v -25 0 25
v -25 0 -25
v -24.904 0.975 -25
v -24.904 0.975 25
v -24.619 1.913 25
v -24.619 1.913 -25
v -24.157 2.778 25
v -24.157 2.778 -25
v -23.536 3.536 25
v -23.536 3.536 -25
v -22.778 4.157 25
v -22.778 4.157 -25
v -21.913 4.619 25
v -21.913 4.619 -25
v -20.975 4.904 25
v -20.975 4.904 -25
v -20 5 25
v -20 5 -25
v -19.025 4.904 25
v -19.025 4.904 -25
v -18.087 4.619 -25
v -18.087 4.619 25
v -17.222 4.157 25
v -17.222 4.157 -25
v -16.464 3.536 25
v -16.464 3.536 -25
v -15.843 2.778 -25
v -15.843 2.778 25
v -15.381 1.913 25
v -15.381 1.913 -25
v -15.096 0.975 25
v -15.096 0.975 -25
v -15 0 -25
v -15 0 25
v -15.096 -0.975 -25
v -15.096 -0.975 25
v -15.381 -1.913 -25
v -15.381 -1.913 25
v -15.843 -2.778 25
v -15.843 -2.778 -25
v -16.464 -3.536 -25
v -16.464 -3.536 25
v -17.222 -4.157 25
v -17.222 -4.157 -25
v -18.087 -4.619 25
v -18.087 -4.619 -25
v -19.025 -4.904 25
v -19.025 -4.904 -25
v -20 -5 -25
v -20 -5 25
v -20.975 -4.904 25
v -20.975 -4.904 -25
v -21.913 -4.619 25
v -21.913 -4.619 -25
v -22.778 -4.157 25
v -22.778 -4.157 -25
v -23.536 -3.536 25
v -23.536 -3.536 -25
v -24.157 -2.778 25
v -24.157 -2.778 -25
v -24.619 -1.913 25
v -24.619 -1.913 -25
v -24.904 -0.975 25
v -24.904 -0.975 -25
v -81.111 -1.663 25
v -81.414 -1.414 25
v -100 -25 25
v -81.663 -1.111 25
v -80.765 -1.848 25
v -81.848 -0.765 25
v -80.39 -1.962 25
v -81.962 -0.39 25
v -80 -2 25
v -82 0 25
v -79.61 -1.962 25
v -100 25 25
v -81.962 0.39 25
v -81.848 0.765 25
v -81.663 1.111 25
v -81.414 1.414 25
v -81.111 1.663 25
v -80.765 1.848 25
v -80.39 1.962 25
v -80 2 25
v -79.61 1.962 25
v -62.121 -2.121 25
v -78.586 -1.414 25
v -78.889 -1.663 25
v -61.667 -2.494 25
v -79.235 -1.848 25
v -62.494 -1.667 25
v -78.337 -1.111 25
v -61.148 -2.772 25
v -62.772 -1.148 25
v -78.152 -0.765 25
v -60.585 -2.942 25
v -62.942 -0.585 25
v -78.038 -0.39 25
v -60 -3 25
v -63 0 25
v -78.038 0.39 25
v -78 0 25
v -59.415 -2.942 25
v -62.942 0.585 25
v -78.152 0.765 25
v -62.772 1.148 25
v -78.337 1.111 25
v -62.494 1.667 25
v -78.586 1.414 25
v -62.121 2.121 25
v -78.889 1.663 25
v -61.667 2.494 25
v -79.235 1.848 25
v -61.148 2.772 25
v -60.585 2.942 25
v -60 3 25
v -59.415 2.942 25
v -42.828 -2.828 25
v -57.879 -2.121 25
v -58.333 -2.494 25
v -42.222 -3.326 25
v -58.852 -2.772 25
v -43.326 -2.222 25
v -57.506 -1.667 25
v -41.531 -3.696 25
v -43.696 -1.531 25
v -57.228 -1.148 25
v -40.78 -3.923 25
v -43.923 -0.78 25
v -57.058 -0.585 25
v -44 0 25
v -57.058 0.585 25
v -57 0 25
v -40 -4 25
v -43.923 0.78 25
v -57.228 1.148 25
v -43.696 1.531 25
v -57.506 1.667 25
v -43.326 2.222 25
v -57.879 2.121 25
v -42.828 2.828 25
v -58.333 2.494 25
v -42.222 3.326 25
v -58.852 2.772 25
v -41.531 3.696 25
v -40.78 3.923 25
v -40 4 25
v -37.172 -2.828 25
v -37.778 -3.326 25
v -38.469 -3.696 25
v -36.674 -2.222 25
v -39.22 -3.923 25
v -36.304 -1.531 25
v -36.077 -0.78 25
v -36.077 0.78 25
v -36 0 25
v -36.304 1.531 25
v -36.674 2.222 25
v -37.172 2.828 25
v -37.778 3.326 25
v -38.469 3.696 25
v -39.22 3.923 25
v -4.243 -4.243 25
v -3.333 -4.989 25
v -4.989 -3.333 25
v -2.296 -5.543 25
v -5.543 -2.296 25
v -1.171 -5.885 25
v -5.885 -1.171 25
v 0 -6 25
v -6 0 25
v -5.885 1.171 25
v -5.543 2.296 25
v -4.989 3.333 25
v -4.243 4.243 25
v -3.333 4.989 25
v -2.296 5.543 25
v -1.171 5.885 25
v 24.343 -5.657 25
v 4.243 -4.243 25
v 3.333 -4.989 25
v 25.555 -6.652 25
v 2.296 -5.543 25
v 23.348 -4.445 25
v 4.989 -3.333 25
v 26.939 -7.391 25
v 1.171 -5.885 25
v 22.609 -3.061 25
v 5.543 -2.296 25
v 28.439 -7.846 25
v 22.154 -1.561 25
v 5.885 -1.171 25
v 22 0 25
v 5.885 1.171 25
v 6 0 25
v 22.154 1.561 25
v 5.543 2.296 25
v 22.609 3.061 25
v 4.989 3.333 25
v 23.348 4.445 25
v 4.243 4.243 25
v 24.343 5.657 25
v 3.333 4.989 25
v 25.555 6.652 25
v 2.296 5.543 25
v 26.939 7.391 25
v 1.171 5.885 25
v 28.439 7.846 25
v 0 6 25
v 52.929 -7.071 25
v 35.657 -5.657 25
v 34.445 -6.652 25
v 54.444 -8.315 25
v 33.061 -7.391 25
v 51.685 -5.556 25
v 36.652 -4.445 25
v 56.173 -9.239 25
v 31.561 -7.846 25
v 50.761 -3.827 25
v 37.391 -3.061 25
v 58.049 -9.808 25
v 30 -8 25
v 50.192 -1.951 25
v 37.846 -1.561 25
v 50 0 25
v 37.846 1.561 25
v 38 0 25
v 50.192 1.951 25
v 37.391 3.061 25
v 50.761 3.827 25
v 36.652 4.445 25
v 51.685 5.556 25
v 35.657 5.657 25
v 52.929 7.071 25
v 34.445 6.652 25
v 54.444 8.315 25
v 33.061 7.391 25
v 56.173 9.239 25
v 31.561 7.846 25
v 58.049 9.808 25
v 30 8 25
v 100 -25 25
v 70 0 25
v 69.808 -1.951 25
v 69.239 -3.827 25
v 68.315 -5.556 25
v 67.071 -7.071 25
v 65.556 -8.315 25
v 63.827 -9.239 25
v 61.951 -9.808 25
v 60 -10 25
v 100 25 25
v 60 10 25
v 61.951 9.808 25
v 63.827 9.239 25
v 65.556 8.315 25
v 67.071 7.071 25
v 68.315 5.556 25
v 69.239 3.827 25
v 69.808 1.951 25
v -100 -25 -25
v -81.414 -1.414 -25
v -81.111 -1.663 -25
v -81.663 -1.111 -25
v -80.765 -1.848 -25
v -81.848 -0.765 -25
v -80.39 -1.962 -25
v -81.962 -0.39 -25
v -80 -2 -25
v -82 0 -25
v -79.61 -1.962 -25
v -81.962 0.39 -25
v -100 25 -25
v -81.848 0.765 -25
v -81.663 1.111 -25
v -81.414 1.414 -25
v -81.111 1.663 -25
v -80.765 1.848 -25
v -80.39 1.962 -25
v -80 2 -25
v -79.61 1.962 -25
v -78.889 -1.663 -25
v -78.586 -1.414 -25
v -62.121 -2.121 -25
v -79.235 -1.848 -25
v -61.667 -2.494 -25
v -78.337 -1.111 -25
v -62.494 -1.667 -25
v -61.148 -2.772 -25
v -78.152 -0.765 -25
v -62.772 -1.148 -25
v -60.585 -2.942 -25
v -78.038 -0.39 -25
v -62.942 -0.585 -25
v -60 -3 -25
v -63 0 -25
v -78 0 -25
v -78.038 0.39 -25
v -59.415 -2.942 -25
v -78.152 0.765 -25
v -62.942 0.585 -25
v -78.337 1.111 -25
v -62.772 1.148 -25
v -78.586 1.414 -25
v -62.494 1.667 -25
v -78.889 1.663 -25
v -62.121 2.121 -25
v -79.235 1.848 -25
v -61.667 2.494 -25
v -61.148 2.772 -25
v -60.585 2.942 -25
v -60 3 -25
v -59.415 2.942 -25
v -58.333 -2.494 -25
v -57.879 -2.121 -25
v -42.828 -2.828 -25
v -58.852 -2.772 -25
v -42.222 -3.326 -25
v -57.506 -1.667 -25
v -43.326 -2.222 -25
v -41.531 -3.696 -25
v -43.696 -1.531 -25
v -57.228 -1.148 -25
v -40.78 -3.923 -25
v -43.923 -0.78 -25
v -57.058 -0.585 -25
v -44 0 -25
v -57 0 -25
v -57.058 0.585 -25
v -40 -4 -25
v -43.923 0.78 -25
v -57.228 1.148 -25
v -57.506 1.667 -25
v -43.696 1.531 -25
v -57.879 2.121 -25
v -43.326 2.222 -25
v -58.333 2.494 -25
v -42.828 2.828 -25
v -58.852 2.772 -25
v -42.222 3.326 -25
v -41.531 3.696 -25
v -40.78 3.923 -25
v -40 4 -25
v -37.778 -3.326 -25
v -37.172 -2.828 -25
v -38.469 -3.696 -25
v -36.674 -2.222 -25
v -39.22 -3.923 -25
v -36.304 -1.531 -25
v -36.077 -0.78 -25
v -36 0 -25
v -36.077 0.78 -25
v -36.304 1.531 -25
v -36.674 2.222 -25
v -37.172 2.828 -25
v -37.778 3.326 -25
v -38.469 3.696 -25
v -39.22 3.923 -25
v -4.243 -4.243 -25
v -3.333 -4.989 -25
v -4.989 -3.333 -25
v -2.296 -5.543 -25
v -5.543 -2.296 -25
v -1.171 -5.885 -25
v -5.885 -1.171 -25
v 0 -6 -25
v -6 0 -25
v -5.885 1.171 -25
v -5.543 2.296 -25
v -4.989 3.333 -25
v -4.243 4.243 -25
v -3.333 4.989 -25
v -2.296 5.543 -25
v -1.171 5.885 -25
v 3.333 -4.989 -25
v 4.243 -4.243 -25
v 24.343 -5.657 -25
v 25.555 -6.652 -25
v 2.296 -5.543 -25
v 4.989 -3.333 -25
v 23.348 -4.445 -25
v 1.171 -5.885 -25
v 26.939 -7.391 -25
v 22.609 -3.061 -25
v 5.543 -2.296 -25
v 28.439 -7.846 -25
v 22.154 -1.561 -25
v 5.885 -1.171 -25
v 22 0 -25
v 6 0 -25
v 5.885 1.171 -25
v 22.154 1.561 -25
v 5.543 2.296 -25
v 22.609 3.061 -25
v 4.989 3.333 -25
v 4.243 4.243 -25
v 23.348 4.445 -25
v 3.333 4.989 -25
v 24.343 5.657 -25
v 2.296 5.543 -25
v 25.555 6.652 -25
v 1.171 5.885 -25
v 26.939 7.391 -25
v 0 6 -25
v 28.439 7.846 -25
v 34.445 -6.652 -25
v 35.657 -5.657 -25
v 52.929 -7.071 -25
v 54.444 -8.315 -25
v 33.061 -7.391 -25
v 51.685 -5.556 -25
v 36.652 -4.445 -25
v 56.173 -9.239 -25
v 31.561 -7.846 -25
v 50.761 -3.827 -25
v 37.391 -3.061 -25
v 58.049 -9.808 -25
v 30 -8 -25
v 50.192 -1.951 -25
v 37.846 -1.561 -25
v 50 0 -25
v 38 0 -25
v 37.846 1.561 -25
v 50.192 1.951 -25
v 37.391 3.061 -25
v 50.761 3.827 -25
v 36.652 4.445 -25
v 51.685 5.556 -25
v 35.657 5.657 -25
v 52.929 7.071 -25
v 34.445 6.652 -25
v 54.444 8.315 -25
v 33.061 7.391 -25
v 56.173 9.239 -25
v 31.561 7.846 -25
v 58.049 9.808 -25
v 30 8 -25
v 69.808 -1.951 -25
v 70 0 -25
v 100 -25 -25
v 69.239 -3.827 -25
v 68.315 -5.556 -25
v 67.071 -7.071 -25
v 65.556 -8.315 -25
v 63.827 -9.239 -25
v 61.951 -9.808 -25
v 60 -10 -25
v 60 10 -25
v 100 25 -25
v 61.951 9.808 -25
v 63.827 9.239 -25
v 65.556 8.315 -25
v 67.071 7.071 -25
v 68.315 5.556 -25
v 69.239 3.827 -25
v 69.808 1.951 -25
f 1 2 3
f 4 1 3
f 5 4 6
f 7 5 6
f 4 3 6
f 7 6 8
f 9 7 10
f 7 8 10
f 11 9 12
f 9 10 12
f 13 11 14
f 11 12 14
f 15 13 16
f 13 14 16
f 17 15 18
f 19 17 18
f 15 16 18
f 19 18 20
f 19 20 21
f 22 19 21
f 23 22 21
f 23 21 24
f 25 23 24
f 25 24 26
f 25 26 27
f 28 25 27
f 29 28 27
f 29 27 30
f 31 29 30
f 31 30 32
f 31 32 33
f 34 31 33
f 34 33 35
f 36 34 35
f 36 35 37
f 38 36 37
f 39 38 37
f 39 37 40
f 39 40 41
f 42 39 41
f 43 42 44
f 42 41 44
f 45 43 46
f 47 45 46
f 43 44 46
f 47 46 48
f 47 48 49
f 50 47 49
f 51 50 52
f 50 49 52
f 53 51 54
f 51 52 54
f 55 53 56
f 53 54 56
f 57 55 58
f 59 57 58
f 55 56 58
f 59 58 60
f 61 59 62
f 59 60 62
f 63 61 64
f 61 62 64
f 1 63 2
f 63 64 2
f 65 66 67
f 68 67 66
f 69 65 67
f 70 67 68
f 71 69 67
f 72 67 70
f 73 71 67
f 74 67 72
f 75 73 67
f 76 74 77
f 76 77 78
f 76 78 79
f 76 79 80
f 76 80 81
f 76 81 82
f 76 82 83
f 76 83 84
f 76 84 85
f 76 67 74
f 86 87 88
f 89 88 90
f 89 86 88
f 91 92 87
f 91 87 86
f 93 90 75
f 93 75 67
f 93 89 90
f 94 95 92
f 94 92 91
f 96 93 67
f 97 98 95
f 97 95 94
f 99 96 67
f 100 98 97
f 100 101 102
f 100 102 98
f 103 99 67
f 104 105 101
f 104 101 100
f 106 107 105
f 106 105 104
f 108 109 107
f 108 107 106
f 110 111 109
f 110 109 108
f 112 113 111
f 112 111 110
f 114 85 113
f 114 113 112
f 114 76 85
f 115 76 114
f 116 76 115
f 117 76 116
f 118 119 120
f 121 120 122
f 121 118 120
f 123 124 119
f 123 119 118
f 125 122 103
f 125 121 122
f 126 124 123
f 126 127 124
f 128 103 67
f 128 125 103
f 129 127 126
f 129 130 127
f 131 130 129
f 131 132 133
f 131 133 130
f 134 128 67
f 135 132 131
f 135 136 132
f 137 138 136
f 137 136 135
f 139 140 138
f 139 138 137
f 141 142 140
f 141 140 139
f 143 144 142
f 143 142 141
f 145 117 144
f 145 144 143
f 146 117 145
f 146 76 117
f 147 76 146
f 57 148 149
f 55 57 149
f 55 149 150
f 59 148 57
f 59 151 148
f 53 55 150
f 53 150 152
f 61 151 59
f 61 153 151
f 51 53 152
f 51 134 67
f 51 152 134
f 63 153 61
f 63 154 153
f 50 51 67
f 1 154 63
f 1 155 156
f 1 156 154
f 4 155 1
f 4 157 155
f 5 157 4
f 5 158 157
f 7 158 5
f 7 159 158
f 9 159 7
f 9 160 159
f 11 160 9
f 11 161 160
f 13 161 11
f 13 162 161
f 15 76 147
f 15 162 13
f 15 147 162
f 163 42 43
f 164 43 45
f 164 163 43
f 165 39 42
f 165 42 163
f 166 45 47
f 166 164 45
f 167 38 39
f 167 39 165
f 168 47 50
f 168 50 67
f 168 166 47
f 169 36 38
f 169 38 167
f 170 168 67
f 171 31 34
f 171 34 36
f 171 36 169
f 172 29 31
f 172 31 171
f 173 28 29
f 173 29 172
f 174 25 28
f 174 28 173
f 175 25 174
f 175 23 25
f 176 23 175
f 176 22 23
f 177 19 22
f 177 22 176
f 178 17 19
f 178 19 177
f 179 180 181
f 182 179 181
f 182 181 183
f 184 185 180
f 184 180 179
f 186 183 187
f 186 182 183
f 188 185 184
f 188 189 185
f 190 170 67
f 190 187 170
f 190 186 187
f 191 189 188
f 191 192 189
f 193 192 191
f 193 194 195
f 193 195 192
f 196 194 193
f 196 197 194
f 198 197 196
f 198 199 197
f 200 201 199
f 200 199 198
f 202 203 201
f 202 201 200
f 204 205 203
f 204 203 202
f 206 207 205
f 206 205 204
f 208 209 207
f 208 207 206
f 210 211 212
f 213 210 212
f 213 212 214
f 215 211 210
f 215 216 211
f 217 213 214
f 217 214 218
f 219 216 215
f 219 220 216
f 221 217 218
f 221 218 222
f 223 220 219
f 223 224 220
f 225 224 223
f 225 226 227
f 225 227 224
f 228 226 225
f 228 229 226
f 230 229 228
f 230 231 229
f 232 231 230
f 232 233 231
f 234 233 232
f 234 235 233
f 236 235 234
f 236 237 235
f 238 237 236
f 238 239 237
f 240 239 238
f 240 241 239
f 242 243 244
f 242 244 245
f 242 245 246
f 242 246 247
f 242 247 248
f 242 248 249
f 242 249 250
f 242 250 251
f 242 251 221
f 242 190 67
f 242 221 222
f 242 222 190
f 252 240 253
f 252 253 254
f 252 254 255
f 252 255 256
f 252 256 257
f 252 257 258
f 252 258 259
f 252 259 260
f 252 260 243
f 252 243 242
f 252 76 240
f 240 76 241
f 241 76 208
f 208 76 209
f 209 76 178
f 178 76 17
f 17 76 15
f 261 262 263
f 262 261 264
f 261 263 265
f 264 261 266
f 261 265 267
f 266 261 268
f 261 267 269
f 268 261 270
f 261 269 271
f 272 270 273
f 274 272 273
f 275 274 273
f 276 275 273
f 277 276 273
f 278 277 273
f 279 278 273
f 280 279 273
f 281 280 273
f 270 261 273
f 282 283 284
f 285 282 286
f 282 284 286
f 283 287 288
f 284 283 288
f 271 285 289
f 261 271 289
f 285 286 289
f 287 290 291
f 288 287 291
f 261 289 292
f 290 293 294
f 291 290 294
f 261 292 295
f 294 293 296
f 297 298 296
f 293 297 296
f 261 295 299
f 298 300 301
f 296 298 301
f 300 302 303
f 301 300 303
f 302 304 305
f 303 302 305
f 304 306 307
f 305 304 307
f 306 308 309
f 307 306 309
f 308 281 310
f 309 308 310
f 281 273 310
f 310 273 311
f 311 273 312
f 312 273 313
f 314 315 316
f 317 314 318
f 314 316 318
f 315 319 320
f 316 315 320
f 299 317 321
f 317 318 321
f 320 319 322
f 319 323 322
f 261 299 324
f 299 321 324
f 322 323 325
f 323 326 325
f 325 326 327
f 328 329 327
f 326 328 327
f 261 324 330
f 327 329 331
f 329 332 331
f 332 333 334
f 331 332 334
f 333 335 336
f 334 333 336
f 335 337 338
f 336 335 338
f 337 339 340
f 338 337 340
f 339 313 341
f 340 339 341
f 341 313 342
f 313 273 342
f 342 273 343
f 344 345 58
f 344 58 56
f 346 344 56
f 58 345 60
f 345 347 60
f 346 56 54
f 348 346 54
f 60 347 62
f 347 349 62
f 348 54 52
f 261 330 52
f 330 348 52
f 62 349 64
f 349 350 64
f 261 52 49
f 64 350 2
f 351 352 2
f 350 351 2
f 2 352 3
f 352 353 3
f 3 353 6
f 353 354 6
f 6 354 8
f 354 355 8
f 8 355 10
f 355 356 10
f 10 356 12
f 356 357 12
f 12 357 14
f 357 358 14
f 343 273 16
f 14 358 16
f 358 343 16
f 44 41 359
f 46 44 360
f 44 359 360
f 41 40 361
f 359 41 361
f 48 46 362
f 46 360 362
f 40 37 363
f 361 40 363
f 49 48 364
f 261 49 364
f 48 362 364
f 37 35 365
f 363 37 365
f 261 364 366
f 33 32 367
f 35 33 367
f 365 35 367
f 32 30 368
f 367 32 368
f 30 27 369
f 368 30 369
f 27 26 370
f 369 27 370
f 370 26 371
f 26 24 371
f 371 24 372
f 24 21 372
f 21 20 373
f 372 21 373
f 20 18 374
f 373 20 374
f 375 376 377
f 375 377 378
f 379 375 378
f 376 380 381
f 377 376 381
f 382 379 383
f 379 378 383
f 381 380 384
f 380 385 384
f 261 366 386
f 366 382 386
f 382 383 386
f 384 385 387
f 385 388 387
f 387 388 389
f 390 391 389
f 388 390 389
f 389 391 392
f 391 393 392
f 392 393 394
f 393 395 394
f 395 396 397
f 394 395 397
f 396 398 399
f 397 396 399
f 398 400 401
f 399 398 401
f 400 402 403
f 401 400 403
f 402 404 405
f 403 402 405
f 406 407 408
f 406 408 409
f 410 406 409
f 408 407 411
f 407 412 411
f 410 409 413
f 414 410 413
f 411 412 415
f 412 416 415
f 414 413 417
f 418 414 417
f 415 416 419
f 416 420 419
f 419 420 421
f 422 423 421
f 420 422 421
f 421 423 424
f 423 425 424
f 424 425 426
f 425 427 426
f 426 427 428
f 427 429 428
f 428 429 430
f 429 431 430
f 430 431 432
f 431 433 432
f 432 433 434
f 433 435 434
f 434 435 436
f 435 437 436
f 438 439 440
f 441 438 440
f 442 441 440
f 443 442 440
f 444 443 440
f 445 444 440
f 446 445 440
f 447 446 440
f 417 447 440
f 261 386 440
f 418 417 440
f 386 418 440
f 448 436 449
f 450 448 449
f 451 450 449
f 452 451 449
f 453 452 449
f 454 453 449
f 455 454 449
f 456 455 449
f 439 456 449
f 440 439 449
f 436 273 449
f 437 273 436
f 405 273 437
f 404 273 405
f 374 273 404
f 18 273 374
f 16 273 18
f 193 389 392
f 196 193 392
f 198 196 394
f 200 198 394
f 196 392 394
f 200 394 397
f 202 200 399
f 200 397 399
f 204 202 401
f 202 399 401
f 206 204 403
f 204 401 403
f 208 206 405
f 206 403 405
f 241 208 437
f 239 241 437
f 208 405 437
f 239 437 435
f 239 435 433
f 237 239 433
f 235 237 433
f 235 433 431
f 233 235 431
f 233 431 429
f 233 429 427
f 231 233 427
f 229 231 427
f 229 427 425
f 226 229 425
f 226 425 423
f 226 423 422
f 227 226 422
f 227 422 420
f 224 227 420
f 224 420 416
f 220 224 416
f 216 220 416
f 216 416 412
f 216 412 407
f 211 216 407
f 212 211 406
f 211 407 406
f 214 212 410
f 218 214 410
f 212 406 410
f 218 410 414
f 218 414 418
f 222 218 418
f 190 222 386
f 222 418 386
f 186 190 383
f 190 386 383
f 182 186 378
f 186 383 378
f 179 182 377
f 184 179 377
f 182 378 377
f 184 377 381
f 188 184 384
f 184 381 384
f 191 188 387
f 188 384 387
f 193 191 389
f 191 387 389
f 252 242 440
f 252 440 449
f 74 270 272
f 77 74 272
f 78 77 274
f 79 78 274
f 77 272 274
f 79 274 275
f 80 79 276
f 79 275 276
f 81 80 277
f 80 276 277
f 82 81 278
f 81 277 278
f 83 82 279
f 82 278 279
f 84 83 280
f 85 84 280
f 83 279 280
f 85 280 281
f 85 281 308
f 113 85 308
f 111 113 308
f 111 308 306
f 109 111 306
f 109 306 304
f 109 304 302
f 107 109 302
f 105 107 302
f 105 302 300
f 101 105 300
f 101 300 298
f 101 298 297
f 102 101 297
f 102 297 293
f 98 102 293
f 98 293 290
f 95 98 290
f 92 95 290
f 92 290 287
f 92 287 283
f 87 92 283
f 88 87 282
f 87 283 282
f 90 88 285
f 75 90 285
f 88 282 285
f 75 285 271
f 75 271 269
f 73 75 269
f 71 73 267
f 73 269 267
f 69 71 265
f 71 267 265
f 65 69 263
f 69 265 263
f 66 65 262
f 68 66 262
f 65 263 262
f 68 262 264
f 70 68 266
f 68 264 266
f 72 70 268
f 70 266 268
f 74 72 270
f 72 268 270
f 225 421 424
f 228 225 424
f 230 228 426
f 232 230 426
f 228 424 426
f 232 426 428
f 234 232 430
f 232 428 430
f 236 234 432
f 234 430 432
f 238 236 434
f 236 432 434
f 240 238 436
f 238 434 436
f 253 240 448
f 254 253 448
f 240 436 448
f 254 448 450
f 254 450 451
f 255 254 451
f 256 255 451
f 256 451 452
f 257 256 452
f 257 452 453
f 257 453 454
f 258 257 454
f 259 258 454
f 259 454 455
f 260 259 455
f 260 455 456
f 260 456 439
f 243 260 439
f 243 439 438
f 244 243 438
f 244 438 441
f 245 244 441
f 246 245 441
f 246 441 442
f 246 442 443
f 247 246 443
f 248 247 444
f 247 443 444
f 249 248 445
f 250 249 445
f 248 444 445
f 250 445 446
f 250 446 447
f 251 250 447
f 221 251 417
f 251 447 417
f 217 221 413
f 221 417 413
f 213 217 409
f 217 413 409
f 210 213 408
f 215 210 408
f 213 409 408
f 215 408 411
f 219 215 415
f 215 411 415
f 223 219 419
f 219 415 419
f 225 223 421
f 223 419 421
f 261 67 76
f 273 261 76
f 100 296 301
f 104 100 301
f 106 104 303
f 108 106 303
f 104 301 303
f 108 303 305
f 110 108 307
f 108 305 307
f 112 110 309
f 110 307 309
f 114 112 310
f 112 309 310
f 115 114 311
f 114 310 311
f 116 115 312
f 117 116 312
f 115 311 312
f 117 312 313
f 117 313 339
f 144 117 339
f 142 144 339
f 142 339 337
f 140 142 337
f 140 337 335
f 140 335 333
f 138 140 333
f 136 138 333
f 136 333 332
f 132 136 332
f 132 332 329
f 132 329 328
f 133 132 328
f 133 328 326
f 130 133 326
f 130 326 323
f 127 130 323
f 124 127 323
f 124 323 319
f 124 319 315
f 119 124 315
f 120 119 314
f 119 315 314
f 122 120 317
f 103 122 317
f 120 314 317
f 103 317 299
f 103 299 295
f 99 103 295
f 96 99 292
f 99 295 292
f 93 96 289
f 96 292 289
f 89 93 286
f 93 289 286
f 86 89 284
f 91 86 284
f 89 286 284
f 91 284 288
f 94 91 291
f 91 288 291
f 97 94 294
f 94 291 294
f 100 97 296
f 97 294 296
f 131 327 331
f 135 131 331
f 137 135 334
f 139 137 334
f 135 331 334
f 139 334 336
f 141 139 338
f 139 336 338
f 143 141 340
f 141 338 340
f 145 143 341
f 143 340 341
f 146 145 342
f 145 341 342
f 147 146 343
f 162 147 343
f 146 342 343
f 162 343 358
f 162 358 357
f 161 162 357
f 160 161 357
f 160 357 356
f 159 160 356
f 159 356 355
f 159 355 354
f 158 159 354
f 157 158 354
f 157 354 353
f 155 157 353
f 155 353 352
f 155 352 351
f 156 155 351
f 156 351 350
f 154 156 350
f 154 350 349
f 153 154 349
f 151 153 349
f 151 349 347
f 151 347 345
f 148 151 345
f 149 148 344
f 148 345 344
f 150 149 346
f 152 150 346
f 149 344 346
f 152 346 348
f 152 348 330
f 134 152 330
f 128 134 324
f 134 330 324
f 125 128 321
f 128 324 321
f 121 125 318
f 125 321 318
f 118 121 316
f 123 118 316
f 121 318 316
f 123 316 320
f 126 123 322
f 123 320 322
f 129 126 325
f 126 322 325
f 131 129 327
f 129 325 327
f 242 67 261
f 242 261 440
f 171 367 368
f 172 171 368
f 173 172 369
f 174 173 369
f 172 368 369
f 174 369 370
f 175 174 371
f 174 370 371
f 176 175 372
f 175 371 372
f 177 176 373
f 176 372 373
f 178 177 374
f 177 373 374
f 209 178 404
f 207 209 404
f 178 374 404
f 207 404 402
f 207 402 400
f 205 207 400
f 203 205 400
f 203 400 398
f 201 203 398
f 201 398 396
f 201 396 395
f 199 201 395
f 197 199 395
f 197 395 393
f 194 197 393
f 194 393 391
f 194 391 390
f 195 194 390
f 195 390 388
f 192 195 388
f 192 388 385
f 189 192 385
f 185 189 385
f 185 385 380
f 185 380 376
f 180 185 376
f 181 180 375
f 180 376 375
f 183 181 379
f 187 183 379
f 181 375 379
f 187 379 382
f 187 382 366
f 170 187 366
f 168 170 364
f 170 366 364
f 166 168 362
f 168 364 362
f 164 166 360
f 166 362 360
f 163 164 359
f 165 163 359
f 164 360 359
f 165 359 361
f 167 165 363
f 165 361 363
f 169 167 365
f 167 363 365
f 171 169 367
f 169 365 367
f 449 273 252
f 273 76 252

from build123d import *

# Parameters (mm, degrees)
F0_W     = 200
F0_H     = 50
F1_DEPTH = 25
F3_D     = 4
F4_D     = 6
F5_D     = 8
F6_D     = 10
F7_D     = 12
F8_D     = 16
F9_D     = 20


with BuildPart() as f1:
    # F0 (on Top) → F1 (new body, symmetric)
    with BuildSketch(Plane.XY):
        Rectangle(F0_W, F0_H)
    extrude(amount=F1_DEPTH, both=True)

    # F3 (through all)
    with Locations(Plane.XY.offset(25)):
        with Locations((-80, 0)):
            Hole(F3_D / 2)

    # F4 (through all)
    with Locations(Plane.XY.offset(25)):
        with Locations((-60, 0)):
            Hole(F4_D / 2)

    # F5 (through all)
    with Locations(Plane.XY.offset(25)):
        with Locations((-40, 0)):
            Hole(F5_D / 2)

    # F6 (through all)
    with Locations(Plane.XY.offset(25)):
        with Locations((-20, 0)):
            Hole(F6_D / 2)

    # F7 (through all)
    with Locations(Plane.XY.offset(25)):
        with Locations((0, 0)):
            Hole(F7_D / 2)

    # F8 (through all)
    with Locations(Plane.XY.offset(25)):
        with Locations((30, 0)):
            Hole(F8_D / 2)

    # F9 (through all)
    with Locations(Plane.XY.offset(25)):
        with Locations((60, 0)):
            Hole(F9_D / 2)


solid = f1.part
